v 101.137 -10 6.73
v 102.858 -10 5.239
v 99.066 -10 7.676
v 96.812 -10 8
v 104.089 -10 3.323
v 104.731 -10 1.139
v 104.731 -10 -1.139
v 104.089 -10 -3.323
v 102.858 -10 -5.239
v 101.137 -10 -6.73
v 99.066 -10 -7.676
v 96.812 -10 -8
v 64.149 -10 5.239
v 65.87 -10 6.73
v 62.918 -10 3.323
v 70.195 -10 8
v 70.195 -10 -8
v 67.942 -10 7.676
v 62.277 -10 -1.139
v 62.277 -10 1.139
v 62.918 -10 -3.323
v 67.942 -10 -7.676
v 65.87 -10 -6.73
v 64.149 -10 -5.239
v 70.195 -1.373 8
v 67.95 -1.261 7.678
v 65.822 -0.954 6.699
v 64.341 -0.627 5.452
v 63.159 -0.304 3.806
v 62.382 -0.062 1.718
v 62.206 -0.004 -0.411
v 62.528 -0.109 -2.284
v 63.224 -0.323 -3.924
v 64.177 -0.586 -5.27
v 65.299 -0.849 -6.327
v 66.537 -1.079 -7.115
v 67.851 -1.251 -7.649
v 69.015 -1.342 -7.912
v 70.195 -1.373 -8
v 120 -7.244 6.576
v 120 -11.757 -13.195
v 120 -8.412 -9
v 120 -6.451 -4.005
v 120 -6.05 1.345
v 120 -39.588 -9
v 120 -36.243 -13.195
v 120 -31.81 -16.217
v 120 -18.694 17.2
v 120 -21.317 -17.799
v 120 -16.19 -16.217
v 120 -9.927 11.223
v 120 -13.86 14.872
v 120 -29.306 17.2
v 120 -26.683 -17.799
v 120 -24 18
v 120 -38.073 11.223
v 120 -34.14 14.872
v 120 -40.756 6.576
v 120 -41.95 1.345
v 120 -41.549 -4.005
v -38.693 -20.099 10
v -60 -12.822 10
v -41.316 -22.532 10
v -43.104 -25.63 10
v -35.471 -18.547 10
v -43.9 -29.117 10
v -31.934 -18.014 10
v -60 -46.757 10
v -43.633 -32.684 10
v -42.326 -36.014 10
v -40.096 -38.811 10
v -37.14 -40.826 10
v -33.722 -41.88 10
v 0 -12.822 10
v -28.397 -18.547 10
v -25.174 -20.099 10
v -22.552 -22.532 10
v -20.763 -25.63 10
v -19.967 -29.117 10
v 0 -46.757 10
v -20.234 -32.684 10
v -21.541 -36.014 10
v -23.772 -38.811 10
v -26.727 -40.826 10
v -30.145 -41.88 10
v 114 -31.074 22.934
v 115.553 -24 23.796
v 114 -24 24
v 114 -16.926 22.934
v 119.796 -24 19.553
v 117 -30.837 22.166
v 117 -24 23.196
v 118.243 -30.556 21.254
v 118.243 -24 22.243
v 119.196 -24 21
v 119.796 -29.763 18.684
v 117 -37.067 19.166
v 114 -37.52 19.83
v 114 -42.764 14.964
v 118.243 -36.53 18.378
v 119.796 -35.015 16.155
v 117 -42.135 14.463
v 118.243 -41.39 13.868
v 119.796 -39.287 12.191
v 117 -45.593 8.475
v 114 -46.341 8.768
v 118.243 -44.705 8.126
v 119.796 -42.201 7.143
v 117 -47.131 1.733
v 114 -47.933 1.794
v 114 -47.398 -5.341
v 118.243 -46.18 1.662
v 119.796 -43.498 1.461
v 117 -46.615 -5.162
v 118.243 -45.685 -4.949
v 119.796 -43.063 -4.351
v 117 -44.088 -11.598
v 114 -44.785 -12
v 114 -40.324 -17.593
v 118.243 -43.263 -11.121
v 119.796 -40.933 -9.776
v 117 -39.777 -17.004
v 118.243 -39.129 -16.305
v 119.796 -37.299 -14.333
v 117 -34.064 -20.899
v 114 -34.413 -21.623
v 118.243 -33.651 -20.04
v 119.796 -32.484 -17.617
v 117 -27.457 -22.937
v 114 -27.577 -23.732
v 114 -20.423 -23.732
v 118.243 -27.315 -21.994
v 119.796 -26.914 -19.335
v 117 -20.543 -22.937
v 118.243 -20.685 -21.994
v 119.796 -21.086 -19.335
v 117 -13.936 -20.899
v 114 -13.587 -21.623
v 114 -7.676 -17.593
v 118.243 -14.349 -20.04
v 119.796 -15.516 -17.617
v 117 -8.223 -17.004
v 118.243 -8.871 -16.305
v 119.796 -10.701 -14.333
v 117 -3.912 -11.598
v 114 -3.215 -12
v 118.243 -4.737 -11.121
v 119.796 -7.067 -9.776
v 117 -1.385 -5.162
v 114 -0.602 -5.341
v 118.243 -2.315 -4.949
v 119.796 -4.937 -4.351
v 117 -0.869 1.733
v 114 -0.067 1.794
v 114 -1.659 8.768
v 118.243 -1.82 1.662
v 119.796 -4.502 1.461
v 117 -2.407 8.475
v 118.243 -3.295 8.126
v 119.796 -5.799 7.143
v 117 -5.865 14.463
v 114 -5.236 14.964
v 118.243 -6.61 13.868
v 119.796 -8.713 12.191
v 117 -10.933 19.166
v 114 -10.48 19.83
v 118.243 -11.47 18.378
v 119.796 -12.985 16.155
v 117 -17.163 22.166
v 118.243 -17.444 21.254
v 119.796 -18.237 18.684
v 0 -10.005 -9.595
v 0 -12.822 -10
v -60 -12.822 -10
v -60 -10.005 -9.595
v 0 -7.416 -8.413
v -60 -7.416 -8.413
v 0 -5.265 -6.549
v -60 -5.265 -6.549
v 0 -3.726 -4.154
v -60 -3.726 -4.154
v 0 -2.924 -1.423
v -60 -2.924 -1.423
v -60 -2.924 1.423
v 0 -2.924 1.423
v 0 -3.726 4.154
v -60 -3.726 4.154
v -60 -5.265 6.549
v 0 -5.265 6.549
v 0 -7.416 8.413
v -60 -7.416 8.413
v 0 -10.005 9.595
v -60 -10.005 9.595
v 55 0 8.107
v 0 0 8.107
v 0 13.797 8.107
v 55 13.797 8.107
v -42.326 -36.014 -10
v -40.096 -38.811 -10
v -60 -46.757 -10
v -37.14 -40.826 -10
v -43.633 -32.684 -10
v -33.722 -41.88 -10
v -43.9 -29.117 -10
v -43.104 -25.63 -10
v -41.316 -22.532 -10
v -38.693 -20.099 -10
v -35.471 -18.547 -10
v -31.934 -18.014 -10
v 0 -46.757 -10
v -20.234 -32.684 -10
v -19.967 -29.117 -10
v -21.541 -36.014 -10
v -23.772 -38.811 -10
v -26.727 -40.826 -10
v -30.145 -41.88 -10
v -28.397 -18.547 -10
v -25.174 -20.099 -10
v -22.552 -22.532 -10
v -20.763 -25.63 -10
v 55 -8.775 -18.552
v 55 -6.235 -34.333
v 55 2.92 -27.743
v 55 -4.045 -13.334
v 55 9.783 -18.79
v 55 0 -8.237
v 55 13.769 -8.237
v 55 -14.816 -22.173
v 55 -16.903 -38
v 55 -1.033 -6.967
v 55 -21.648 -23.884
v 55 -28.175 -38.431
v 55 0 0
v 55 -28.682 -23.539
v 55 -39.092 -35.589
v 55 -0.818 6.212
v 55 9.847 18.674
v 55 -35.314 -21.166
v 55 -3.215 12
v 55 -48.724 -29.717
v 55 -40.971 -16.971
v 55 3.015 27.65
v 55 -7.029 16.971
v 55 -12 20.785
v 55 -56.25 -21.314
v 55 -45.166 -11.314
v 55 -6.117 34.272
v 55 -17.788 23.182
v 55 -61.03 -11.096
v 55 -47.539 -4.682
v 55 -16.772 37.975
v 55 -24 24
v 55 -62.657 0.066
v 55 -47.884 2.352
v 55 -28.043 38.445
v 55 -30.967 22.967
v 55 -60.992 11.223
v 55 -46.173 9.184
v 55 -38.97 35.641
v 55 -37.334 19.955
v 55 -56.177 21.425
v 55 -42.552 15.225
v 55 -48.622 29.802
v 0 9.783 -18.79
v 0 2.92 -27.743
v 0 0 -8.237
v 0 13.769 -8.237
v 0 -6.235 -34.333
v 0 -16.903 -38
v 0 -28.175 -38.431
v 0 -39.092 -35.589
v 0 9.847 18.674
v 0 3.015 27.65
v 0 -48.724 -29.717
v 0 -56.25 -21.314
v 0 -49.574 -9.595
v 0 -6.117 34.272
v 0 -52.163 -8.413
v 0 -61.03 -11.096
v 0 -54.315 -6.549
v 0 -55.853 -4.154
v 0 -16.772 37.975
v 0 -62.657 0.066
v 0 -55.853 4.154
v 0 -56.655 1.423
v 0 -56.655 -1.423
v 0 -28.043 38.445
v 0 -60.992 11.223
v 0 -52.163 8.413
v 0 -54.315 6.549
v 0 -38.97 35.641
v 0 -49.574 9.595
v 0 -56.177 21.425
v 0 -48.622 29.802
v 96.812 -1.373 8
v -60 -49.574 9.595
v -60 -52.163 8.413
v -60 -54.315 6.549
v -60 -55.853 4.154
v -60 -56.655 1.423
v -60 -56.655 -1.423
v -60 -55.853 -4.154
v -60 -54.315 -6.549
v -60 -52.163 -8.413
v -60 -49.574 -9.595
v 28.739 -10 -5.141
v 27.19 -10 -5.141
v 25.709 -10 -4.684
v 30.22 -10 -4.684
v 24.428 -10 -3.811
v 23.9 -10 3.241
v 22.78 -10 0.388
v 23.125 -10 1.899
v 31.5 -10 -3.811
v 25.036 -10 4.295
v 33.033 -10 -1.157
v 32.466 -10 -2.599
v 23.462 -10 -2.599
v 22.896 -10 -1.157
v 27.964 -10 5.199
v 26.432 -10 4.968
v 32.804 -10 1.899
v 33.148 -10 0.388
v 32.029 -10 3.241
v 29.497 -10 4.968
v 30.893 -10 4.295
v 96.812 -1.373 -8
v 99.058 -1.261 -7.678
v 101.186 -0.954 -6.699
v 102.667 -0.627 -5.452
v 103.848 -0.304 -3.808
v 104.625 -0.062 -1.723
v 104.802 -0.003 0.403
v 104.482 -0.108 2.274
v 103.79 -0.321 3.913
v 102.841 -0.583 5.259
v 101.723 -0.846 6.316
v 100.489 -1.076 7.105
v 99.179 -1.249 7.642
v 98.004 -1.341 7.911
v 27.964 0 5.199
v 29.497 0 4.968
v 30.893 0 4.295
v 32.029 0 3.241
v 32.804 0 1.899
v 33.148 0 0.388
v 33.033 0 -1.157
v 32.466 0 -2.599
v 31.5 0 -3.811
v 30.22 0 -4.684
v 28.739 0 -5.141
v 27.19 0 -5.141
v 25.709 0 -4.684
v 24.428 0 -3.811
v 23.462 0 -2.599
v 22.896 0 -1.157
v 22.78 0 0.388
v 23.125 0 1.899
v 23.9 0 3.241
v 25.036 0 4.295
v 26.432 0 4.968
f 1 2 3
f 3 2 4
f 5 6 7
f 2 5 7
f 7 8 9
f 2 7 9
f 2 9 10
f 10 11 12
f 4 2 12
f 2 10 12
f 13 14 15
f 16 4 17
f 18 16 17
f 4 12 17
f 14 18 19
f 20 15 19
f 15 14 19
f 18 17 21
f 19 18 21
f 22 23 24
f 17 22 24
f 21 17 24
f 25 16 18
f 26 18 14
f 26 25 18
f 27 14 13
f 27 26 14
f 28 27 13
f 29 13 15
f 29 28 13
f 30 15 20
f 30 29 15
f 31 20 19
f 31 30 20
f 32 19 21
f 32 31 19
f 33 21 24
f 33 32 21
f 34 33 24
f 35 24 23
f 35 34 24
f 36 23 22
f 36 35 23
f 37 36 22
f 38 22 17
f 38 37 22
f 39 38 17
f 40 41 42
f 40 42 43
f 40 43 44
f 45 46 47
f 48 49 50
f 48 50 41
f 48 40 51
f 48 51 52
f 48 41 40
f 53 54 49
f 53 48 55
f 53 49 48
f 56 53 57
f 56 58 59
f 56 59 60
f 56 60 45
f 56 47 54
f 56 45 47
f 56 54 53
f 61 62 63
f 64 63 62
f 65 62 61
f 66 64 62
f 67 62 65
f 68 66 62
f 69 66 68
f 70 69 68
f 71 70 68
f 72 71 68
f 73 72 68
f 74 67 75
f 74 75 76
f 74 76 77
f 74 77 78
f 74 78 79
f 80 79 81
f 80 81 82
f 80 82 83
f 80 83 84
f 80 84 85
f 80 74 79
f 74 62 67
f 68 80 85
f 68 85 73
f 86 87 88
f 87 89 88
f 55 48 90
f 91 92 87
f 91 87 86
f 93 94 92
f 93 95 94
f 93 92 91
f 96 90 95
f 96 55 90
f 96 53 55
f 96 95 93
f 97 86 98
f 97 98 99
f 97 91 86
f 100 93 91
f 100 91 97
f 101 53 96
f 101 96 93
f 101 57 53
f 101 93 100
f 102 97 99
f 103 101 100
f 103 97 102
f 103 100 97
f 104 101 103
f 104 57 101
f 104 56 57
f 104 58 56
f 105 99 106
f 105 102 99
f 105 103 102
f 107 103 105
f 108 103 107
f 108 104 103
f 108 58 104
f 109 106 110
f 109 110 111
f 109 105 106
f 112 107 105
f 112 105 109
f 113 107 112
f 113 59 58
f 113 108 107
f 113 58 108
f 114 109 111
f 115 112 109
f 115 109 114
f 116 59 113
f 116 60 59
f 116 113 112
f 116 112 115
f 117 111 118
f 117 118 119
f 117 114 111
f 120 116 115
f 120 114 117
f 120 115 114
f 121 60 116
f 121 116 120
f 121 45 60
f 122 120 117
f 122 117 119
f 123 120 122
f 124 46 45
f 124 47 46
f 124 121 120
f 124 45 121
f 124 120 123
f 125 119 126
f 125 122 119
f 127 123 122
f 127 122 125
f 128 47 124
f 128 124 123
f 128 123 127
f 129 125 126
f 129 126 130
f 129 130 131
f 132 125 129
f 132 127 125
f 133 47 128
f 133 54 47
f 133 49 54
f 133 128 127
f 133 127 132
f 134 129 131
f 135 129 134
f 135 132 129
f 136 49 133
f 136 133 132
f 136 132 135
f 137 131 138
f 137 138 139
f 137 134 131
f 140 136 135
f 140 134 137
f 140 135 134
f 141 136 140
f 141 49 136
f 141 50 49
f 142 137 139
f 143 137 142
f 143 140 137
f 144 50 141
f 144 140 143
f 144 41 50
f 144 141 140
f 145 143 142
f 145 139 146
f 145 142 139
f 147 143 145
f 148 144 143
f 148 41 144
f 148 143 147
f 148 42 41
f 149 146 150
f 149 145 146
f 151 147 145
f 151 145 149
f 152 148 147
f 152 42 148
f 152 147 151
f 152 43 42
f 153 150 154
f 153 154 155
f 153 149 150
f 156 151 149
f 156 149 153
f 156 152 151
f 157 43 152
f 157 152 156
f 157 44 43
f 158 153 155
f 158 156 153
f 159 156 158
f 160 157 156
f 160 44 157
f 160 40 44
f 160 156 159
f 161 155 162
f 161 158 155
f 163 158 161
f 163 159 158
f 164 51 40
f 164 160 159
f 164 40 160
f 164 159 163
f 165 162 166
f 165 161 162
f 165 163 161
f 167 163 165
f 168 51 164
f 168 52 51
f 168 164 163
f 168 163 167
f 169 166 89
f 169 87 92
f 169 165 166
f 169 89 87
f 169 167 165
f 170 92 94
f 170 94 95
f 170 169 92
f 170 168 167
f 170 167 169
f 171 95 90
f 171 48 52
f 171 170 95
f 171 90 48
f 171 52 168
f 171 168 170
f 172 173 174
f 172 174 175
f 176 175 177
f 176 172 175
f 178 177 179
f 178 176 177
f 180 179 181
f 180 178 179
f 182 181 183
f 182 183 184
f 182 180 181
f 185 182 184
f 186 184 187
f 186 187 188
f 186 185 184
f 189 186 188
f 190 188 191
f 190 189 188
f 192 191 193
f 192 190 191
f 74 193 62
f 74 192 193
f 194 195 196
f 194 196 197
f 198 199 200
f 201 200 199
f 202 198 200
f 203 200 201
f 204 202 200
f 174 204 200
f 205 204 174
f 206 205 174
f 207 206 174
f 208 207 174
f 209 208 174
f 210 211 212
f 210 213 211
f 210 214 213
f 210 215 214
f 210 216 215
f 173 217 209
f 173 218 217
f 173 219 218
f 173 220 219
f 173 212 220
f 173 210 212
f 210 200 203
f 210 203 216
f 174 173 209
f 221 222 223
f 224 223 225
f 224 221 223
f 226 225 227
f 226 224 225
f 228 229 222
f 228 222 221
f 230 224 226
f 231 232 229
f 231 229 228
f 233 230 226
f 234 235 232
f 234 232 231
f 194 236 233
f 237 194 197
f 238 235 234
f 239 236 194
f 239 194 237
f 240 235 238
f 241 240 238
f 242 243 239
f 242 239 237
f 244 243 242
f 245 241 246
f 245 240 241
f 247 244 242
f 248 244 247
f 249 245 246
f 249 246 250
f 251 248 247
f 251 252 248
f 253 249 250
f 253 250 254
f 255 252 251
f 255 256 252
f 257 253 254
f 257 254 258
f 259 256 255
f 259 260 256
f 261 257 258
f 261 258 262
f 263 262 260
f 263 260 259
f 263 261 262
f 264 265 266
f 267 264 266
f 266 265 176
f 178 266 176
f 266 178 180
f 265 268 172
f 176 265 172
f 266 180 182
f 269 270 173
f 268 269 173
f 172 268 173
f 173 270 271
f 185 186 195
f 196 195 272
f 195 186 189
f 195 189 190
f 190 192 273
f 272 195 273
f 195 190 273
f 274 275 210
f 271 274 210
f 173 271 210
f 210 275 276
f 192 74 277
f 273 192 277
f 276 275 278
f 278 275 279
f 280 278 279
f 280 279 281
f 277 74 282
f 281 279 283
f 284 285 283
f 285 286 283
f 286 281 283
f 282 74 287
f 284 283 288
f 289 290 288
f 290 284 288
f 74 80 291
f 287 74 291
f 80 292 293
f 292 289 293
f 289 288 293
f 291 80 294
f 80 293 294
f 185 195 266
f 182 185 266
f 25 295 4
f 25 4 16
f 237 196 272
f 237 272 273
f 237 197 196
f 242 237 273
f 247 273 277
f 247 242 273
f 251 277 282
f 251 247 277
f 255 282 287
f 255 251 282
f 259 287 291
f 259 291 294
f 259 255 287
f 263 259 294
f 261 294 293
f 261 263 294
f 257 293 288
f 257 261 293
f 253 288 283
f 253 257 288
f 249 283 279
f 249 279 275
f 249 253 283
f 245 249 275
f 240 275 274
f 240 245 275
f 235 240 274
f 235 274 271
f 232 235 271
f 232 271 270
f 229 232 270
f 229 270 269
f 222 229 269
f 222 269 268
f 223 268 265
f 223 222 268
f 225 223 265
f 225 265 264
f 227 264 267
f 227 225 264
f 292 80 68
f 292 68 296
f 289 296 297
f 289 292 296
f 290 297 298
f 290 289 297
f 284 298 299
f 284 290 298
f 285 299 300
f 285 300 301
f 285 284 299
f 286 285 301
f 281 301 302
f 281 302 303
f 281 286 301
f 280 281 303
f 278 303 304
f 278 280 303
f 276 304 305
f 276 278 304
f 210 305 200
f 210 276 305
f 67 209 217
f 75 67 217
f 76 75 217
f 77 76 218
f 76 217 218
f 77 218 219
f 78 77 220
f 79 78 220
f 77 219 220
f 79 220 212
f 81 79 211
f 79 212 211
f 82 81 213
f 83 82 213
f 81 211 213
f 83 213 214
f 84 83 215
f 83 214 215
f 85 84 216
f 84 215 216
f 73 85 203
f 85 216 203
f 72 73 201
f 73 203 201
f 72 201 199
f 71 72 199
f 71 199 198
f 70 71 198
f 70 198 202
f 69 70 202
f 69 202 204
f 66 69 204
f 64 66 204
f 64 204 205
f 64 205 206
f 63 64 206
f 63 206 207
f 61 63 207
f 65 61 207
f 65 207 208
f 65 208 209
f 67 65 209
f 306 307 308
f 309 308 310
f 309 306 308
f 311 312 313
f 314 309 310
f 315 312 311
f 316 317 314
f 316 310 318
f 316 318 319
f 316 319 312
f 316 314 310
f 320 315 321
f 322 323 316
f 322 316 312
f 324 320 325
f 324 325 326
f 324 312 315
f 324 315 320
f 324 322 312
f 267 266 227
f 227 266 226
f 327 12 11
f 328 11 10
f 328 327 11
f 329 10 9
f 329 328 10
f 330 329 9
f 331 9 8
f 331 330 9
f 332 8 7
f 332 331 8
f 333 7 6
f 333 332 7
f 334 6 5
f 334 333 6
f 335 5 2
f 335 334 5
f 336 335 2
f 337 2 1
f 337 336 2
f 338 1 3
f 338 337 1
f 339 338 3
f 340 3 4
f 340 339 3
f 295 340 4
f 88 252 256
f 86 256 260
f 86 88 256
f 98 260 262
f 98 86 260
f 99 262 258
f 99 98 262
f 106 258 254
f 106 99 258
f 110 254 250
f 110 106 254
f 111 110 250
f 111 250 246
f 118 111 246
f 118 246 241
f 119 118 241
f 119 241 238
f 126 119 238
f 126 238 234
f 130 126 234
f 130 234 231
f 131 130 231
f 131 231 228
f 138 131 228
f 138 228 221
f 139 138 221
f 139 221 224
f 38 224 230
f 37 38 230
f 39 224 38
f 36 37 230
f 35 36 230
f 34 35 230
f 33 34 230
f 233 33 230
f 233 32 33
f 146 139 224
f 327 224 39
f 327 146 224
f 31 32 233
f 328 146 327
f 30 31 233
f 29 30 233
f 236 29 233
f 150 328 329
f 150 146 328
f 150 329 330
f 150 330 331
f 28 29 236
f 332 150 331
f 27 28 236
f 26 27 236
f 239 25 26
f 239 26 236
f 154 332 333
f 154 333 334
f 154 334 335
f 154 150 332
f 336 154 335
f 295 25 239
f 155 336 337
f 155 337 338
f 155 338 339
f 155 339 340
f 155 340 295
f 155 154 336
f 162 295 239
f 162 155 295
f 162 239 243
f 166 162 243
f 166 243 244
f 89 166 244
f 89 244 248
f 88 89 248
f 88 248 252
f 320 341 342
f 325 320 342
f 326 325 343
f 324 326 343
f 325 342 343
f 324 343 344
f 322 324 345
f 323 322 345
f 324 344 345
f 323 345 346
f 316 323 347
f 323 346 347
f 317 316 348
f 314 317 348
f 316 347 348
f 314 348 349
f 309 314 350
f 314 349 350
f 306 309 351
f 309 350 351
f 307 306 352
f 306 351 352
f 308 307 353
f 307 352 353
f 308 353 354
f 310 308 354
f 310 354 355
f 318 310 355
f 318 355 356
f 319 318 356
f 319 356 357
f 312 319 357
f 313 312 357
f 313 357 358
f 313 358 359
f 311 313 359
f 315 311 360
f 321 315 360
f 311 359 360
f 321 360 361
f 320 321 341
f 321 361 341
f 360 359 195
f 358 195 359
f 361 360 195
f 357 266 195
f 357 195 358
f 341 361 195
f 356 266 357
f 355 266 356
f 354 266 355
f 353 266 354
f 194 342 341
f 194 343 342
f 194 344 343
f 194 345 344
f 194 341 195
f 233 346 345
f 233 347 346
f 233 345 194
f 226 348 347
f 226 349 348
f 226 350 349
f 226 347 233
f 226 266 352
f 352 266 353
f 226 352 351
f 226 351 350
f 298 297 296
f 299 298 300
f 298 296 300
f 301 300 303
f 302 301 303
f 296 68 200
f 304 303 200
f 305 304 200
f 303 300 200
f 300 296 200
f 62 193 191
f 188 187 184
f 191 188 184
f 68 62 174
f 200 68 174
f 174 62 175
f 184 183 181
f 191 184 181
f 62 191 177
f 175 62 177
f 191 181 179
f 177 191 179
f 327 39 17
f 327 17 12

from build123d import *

# Parameters (mm, degrees)
FILLET1_R           = 6
CUT_EXTRUDE8_DEPTH  = 10
SKETCH6_W           = 55
SKETCH6_H           = 16.343735742
CUT_EXTRUDE15_DEPTH = 20
SKETCH7_R           = 5.198582593
CUT_EXTRUDE16_DEPTH = 10
BOSS_EXTRUDE1_DEPTH = 60
SKETCH9_R           = 12
CUT_EXTRUDE17_DEPTH = 60


with BuildPart() as part:
    # Sketch1 → Revolve1 (revolve)
    with BuildSketch(Plane.XY, mode=Mode.PRIVATE) as revolve1_sk:
        Polygon((0, 0), (0, 14.656862745), (55, 14.656862745), (55, 0), (120, 0), (120, -24), (0, -24), align=None)
    revolve(revolve1_sk.sketch.rotate(Axis((-5.281550193, -24, 0), (1, 0, 0)), 90), axis=Axis((-5.281550193, -24, 0), (1, 0, 0)))

    # Fillet1
    fillet1_edges = [part.edges().sort_by_distance(p)[0] for p in [
        (120, -24, -24),
    ]]
    fillet(fillet1_edges, radius=FILLET1_R)

    # Sketch2 → Cut-Extrude8 (cut)
    with BuildSketch(Plane(origin=(0, 0, 0), x_dir=(1, 0, 0), z_dir=(0, 1, 0))):
        with BuildLine():
            Line((70.195378011, 8), (96.812319076, 8))
            ThreePointArc((96.812319076, 8), (104.812319076, 0), (96.812319076, -8))
            Line((96.812319076, -8), (70.195378011, -8))
            ThreePointArc((70.195378011, -8), (62.195378011, 0), (70.195378011, 8))
        make_face()
    extrude(amount=-CUT_EXTRUDE8_DEPTH, mode=Mode.SUBTRACT)

    # Sketch6 → Cut-Extrude15 (cut)
    with BuildSketch(Plane(origin=(0, 0, 0), x_dir=(1, 0, 0), z_dir=(0, 1, 0))):
        with Locations((27.5, 0.064856094)):
            Rectangle(SKETCH6_W, SKETCH6_H)
    extrude(amount=CUT_EXTRUDE15_DEPTH, mode=Mode.SUBTRACT)

    # Sketch7 → Cut-Extrude16 (cut)
    with BuildSketch(Plane(origin=(0, 0, 0), x_dir=(1, 0, 0), z_dir=(0, 1, 0))):
        with Locations(Location((27.964324109, 0, 0), (0, 0, 270))):
            Circle(SKETCH7_R)
    extrude(amount=-CUT_EXTRUDE16_DEPTH, mode=Mode.SUBTRACT)

    # Sketch8 → Boss-Extrude1 (add)
    with BuildSketch(Plane.ZY):
        with BuildLine():
            Line((10, -12.82210563), (10, -46.757053375))
            ThreePointArc((10, -46.757053375), (0, -56.757053375), (-10, -46.757053375))
            Line((-10, -46.757053375), (-10, -12.82210563))
            ThreePointArc((-10, -12.82210563), (0, -2.82210563), (10, -12.82210563))
        make_face()
    extrude(amount=BOSS_EXTRUDE1_DEPTH)

    # Sketch9 → Cut-Extrude17 (cut)
    with BuildSketch(Plane(origin=(0, 0, -10), x_dir=(-1, 0, 0), z_dir=(0, 0, -1))):
        with Locations(Location((31.933586772, -30.014179295, 0), (0, 0, 90))):
            Circle(SKETCH9_R)
    extrude(amount=-CUT_EXTRUDE17_DEPTH, mode=Mode.SUBTRACT)


solid = part.part
